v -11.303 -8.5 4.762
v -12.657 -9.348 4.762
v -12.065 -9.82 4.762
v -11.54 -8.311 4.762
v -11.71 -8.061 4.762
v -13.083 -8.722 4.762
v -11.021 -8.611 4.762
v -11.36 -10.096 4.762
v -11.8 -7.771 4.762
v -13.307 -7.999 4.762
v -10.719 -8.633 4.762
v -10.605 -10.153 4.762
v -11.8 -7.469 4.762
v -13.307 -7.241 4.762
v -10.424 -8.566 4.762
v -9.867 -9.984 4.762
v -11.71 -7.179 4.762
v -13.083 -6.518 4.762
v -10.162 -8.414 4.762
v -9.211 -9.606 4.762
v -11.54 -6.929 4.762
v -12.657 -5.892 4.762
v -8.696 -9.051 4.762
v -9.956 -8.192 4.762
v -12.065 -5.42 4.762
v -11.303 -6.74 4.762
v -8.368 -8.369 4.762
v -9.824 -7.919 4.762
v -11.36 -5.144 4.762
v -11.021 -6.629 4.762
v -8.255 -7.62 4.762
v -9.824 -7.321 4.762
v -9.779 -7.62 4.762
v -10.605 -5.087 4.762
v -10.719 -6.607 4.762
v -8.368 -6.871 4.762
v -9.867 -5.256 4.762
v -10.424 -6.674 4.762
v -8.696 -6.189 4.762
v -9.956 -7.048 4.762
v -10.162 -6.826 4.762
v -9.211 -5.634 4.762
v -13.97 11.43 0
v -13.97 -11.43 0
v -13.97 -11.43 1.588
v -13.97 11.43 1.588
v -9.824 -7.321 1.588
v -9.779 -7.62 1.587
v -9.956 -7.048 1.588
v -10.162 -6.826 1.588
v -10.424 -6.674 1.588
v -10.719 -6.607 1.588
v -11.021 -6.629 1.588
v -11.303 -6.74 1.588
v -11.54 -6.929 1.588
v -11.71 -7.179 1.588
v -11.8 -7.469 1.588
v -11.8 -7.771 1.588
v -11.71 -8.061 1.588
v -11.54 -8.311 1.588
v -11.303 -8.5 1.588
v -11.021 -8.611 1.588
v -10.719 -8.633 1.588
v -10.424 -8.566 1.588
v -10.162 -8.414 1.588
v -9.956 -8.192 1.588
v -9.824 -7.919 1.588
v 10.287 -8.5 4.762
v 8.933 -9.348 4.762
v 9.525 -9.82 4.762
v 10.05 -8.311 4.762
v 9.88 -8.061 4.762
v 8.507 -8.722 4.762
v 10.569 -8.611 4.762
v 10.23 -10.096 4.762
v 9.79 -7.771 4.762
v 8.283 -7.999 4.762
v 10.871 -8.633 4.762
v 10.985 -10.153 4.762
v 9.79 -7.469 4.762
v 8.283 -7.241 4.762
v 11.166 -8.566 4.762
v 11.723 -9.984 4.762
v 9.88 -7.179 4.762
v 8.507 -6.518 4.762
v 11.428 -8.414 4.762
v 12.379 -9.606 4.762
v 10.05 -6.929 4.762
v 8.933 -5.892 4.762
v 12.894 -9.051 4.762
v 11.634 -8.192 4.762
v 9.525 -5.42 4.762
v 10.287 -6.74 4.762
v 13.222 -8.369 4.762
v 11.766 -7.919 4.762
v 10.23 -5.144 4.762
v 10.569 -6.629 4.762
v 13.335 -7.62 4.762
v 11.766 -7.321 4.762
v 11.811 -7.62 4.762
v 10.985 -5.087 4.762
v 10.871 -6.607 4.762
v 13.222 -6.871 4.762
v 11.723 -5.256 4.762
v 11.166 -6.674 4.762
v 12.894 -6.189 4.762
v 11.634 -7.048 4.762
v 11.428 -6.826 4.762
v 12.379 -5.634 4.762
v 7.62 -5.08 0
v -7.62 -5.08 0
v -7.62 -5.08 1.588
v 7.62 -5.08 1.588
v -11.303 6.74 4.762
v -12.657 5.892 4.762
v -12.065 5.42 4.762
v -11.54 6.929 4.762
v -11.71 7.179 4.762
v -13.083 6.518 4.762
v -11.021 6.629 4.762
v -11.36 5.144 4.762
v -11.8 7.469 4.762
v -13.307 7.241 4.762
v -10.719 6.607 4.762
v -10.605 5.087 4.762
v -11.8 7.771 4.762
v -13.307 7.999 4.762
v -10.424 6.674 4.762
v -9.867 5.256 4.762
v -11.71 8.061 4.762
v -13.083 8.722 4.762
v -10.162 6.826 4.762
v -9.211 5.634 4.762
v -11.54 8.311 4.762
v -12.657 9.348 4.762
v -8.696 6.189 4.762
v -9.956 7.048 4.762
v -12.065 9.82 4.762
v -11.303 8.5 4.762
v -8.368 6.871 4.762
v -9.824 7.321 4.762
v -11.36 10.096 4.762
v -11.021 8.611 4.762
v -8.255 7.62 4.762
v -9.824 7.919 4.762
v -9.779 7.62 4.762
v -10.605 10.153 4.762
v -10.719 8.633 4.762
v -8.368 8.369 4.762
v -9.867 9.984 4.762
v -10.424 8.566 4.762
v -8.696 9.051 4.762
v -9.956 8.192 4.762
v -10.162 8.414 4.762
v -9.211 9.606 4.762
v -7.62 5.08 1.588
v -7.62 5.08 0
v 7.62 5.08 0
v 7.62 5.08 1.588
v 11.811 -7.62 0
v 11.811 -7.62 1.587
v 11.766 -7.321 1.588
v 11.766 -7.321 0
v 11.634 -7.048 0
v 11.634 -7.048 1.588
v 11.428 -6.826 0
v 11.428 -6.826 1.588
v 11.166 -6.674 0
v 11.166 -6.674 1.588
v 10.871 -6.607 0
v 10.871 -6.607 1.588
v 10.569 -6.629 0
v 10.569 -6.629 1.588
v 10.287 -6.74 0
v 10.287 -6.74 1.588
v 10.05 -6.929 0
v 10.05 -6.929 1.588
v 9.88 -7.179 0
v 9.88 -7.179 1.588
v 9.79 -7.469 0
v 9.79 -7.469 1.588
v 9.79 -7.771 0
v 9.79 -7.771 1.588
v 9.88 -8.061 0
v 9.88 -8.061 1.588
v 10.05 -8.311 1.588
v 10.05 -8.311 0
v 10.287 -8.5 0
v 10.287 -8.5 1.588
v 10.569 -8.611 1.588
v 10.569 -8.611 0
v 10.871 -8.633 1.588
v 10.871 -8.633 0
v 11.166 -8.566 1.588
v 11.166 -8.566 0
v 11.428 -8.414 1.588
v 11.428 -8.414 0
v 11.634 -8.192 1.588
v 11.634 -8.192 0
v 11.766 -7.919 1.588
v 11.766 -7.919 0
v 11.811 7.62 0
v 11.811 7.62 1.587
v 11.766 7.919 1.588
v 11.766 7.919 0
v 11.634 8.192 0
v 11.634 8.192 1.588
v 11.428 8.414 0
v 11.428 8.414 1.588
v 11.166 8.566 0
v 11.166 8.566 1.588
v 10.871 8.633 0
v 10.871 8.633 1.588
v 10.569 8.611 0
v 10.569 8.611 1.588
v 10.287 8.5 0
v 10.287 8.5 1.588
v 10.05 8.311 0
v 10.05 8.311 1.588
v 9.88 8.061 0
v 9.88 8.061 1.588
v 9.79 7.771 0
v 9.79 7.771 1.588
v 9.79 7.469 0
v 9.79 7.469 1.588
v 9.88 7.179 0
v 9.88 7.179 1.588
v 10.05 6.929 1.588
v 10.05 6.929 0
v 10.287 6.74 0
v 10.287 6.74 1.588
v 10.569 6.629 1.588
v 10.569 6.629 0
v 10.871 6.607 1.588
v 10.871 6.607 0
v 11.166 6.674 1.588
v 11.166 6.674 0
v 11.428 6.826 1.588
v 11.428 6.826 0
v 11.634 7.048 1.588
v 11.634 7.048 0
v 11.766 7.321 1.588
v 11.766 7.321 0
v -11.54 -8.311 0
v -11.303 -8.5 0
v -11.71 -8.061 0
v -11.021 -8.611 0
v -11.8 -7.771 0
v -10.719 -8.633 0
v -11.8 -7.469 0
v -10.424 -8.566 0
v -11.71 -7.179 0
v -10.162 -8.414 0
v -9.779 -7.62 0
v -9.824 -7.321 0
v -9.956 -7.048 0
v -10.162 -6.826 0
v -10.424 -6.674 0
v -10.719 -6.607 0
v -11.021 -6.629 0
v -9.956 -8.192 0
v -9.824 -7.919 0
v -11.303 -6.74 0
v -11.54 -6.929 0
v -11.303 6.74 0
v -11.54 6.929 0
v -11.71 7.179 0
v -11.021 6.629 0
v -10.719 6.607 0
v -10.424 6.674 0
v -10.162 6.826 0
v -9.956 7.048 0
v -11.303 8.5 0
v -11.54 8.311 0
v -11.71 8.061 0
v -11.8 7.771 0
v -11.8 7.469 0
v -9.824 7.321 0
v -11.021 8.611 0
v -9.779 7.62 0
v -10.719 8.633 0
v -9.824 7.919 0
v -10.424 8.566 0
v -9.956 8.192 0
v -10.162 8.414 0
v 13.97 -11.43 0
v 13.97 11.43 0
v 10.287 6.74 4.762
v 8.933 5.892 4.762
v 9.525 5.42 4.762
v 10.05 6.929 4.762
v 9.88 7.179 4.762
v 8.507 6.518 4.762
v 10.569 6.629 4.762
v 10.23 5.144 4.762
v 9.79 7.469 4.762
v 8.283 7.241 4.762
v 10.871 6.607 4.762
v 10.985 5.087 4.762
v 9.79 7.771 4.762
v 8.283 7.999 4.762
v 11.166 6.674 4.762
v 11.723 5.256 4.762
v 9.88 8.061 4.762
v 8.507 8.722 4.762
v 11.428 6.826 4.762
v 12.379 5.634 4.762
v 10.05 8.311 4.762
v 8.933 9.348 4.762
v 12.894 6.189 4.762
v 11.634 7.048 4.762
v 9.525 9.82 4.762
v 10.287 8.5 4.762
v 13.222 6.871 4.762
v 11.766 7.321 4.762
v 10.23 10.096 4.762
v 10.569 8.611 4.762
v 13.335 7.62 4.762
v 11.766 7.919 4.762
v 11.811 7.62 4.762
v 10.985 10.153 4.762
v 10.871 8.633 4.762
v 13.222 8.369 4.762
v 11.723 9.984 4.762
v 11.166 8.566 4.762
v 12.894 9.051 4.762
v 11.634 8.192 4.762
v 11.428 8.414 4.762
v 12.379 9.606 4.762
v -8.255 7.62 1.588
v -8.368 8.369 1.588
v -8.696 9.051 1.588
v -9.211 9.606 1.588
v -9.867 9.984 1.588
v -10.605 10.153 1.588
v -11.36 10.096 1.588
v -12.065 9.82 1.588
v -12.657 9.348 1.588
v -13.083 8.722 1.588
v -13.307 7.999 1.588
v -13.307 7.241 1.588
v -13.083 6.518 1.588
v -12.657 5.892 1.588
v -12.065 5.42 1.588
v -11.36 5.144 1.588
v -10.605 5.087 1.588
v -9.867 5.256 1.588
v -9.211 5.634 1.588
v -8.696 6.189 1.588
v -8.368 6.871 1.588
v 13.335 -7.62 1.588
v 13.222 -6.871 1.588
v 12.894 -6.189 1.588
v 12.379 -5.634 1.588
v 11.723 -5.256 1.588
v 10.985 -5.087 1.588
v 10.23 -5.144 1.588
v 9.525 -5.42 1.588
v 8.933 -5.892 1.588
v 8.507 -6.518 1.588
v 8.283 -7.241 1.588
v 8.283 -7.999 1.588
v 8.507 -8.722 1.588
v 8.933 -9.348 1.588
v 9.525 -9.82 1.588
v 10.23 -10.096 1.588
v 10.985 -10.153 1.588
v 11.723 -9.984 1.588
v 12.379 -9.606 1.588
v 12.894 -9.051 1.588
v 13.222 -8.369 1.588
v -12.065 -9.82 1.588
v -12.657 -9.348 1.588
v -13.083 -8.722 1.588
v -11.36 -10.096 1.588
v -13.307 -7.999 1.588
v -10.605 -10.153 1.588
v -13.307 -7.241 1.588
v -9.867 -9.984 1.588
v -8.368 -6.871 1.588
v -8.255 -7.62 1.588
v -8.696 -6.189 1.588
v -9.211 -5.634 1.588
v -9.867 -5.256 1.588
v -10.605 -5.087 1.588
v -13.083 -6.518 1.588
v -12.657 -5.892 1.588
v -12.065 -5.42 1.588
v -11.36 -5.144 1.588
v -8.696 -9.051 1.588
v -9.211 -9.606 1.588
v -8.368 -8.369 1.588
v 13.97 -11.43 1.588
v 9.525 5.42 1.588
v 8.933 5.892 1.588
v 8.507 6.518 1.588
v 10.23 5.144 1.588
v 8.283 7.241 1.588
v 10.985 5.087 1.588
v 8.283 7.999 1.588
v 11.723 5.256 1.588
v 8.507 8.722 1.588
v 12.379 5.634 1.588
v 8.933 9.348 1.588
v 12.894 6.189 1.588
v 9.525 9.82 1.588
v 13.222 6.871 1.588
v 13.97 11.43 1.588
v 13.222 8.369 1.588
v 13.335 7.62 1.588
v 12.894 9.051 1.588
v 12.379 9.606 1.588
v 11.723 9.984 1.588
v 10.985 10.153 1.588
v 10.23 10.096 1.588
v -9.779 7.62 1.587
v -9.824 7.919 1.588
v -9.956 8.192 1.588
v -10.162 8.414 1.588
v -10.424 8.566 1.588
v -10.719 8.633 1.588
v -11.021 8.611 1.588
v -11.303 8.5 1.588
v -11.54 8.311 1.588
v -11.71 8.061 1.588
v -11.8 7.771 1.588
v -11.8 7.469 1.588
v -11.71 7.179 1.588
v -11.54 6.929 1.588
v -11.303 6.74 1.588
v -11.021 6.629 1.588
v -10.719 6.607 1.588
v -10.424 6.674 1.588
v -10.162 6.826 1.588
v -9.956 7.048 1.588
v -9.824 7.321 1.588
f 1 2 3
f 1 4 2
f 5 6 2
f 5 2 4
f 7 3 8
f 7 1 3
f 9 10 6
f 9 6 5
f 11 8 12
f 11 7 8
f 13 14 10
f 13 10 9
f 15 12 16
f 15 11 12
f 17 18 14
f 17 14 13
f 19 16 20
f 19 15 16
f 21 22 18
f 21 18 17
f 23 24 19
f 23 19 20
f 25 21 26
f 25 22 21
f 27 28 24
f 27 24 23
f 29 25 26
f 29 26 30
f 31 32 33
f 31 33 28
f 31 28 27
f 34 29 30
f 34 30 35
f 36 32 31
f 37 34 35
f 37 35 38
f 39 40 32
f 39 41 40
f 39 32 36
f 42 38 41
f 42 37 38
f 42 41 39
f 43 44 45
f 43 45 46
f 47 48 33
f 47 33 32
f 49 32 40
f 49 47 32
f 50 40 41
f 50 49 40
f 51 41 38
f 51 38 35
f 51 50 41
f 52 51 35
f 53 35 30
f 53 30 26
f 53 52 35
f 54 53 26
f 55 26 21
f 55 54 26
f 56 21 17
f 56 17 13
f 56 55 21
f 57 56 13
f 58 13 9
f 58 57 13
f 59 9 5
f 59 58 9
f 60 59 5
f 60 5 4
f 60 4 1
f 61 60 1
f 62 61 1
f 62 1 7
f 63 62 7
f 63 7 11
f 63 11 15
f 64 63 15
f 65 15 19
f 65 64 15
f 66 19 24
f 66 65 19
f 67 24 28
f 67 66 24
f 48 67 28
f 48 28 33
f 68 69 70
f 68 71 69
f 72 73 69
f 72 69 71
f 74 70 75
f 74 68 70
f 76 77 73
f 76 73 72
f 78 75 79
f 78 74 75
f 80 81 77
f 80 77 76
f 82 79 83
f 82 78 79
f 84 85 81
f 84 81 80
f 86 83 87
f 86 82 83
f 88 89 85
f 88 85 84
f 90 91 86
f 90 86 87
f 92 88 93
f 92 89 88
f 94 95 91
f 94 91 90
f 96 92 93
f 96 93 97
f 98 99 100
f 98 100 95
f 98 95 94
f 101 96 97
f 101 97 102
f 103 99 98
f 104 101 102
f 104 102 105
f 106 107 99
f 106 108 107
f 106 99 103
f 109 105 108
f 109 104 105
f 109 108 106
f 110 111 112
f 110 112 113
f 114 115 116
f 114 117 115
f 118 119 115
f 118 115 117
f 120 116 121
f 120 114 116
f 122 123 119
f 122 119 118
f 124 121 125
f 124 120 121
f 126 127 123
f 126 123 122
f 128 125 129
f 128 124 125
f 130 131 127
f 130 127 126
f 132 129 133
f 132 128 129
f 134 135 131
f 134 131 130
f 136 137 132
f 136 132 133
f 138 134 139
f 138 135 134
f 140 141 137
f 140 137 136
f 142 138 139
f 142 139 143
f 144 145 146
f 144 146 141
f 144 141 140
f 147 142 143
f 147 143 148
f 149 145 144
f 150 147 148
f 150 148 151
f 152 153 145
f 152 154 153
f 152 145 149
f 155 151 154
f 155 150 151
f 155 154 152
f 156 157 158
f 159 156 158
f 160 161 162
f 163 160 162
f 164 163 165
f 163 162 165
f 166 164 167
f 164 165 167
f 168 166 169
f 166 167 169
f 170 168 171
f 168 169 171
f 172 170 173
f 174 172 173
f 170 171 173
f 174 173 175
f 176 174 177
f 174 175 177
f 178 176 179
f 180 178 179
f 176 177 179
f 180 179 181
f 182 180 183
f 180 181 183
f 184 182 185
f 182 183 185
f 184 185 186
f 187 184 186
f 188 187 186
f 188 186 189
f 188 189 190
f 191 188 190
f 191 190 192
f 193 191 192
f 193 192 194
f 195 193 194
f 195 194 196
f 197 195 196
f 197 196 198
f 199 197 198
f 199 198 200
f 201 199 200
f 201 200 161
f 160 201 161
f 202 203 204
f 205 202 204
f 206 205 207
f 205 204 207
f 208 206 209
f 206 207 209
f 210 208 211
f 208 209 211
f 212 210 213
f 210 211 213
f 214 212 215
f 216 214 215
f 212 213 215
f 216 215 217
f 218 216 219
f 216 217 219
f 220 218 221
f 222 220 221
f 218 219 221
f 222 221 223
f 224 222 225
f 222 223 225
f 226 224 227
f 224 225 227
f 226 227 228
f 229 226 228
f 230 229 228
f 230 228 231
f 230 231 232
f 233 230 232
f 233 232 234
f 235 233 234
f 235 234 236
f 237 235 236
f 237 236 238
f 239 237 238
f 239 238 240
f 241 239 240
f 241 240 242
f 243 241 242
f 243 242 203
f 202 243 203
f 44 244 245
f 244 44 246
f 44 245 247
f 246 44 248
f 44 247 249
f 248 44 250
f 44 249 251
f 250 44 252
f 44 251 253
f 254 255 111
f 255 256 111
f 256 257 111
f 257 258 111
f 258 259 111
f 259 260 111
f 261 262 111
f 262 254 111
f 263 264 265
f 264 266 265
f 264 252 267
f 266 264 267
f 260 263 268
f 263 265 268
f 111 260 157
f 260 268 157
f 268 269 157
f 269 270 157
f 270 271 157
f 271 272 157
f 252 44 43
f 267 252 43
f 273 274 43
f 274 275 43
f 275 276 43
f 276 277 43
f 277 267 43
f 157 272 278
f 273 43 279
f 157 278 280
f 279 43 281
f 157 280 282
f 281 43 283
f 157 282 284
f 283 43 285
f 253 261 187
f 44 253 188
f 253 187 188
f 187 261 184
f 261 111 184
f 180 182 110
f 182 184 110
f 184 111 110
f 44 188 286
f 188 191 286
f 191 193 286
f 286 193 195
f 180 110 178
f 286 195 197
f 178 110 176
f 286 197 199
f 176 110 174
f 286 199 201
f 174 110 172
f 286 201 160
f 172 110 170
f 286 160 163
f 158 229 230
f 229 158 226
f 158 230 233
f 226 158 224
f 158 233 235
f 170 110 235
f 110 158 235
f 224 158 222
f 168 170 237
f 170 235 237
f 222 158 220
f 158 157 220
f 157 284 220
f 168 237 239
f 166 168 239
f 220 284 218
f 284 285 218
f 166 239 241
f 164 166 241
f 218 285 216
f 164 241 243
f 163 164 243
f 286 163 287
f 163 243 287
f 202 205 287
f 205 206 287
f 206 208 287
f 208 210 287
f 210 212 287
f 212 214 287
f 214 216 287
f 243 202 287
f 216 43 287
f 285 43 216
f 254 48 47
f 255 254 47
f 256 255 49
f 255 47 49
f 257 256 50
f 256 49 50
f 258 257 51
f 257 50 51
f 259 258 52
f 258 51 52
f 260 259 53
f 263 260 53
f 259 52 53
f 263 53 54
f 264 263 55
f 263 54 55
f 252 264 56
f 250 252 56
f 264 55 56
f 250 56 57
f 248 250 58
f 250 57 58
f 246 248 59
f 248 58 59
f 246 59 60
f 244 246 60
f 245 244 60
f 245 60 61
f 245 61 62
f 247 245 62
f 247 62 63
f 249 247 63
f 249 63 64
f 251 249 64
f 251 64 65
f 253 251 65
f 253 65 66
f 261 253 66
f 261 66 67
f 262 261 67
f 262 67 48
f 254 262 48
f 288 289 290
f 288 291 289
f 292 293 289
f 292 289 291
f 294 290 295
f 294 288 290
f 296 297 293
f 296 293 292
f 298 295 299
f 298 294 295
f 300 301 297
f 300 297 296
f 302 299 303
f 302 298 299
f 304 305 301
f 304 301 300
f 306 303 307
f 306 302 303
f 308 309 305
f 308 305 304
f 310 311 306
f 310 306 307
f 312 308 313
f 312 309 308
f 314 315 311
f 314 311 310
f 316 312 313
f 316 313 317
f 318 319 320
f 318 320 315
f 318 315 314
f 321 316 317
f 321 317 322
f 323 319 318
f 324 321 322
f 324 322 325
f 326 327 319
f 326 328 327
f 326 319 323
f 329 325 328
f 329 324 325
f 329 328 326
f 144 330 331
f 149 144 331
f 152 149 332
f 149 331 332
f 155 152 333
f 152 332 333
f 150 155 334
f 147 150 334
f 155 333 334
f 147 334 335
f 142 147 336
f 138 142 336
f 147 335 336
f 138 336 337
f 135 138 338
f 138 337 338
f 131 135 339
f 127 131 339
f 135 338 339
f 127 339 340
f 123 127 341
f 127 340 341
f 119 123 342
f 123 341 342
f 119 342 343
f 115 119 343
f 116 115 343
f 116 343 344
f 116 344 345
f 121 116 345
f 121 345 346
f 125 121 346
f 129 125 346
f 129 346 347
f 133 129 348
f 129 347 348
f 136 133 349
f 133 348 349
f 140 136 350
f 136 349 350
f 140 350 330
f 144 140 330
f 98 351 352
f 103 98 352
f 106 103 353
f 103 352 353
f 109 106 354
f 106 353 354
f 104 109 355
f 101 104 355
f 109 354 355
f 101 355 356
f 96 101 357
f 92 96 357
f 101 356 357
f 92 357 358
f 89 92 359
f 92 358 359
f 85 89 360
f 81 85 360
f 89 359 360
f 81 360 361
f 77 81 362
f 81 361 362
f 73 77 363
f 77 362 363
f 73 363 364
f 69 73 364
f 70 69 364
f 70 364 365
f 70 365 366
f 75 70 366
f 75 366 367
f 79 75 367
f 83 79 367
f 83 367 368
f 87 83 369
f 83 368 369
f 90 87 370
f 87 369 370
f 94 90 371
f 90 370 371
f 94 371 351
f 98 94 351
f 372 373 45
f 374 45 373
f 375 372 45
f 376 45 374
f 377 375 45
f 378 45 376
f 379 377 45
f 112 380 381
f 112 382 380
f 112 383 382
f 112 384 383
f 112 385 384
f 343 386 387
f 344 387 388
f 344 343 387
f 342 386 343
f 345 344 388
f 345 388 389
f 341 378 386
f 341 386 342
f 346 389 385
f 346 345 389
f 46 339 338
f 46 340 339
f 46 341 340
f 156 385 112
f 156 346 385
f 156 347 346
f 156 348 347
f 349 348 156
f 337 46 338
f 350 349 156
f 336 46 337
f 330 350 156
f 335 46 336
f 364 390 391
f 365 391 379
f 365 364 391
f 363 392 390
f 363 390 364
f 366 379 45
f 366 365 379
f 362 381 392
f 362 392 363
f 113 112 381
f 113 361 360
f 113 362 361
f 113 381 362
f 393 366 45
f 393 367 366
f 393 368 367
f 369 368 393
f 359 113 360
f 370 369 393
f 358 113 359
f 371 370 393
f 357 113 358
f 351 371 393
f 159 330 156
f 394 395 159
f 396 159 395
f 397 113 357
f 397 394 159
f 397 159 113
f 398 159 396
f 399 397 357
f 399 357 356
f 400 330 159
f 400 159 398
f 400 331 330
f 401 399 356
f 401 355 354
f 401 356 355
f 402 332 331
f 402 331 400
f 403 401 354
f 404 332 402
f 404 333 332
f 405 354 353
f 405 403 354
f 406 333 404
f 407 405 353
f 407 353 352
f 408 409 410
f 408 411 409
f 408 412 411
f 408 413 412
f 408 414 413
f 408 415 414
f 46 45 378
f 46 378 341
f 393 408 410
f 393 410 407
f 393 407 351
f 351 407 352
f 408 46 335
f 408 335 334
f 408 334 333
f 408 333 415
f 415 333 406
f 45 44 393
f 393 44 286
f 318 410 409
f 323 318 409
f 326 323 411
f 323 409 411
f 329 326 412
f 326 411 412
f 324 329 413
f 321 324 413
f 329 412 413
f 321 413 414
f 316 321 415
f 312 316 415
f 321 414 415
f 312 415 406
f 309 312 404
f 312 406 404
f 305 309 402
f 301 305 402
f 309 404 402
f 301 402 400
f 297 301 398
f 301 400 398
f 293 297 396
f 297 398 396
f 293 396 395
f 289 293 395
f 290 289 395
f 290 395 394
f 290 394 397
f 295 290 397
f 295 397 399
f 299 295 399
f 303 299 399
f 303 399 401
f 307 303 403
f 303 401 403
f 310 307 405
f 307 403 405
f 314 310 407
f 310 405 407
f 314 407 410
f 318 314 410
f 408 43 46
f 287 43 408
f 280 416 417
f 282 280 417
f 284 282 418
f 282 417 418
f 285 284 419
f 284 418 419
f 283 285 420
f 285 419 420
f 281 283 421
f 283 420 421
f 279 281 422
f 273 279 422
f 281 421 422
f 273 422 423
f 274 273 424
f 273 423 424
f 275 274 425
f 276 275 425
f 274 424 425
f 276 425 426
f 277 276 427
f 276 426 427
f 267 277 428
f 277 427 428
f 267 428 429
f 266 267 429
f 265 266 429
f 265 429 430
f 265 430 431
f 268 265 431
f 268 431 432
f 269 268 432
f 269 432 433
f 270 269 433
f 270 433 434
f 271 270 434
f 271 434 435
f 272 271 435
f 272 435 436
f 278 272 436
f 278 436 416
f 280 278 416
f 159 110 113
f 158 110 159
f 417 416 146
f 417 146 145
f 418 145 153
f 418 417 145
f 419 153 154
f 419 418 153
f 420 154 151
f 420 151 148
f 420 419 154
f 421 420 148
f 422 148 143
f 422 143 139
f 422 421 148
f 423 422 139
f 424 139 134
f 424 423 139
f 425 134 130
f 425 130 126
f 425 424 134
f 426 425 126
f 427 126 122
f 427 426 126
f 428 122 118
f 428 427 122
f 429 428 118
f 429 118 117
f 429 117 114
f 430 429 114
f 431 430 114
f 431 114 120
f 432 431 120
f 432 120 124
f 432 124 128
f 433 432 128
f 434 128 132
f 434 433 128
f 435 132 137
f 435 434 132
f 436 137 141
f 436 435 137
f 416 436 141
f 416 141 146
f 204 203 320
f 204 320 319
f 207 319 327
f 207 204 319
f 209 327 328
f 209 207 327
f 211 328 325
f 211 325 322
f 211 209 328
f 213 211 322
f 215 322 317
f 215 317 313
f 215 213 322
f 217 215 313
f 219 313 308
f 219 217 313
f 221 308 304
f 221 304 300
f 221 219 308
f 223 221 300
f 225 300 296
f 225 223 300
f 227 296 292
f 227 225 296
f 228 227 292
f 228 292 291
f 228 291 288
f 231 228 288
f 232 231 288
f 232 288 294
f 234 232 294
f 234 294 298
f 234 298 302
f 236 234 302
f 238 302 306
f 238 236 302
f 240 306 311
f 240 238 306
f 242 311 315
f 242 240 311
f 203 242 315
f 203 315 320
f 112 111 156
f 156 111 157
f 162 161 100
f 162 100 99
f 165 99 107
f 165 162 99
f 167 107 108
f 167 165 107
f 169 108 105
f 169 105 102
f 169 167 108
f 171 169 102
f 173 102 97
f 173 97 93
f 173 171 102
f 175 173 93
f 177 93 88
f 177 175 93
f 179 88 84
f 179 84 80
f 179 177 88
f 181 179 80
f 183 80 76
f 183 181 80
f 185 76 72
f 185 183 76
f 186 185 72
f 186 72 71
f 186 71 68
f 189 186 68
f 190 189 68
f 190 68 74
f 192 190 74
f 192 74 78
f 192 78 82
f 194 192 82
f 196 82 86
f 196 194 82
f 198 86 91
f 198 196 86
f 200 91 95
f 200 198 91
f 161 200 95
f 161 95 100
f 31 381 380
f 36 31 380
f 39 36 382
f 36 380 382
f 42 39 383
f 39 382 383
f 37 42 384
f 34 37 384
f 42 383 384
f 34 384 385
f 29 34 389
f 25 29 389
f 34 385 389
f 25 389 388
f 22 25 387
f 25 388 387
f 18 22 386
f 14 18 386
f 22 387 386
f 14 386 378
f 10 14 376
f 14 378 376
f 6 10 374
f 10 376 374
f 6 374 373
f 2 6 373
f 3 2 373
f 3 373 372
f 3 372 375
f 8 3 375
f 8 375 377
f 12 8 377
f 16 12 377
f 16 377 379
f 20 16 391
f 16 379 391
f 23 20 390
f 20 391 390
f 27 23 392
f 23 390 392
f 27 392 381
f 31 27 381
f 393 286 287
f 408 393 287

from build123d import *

# Parameters (mm, degrees)
F0_W     = 27.94
F0_H     = 22.86
F0_W_2   = 15.24
F0_H_2   = 10.16
F1_DEPTH = 1.5875
F2_R     = 2.54
F2_R_2   = 1.016
F3_DEPTH = 3.175
F4_DEPTH = 25.4


with BuildPart() as f1:
    # F0 (on Top) → F1 (new body)
    with BuildSketch(Plane.XY):
        Rectangle(F0_W, F0_H)
        Rectangle(F0_W_2, F0_H_2, mode=Mode.SUBTRACT)
    extrude(amount=F1_DEPTH)

    # F2 (on face) → F3 (join)
    with BuildSketch(Plane.XY.offset(1.5875)):
        with Locations((-10.795, -7.62)):
            Circle(F2_R)
        with Locations((-10.795, -7.62)):
            Circle(F2_R_2, mode=Mode.SUBTRACT)
        with Locations((-10.795, 7.62)):
            Circle(F2_R)
        with Locations((-10.795, 7.62)):
            Circle(F2_R_2, mode=Mode.SUBTRACT)
        with Locations((10.795, -7.62)):
            Circle(F2_R)
        with Locations((10.795, -7.62)):
            Circle(F2_R_2, mode=Mode.SUBTRACT)
        with Locations((10.795, 7.62)):
            Circle(F2_R)
        with Locations((10.795, 7.62)):
            Circle(F2_R_2, mode=Mode.SUBTRACT)
    extrude(amount=F3_DEPTH)

    # F2 (on face) → F4 (cut)
    with BuildSketch(Plane.XY.offset(1.5875)):
        with Locations((10.795, -7.62)):
            Circle(F2_R_2)
        with Locations((10.795, 7.62)):
            Circle(F2_R_2)
        with Locations((-10.795, 7.62)):
            Circle(F2_R_2)
        with Locations((-10.795, -7.62)):
            Circle(F2_R_2)
    extrude(amount=-F4_DEPTH, mode=Mode.SUBTRACT)


solid = f1.part
